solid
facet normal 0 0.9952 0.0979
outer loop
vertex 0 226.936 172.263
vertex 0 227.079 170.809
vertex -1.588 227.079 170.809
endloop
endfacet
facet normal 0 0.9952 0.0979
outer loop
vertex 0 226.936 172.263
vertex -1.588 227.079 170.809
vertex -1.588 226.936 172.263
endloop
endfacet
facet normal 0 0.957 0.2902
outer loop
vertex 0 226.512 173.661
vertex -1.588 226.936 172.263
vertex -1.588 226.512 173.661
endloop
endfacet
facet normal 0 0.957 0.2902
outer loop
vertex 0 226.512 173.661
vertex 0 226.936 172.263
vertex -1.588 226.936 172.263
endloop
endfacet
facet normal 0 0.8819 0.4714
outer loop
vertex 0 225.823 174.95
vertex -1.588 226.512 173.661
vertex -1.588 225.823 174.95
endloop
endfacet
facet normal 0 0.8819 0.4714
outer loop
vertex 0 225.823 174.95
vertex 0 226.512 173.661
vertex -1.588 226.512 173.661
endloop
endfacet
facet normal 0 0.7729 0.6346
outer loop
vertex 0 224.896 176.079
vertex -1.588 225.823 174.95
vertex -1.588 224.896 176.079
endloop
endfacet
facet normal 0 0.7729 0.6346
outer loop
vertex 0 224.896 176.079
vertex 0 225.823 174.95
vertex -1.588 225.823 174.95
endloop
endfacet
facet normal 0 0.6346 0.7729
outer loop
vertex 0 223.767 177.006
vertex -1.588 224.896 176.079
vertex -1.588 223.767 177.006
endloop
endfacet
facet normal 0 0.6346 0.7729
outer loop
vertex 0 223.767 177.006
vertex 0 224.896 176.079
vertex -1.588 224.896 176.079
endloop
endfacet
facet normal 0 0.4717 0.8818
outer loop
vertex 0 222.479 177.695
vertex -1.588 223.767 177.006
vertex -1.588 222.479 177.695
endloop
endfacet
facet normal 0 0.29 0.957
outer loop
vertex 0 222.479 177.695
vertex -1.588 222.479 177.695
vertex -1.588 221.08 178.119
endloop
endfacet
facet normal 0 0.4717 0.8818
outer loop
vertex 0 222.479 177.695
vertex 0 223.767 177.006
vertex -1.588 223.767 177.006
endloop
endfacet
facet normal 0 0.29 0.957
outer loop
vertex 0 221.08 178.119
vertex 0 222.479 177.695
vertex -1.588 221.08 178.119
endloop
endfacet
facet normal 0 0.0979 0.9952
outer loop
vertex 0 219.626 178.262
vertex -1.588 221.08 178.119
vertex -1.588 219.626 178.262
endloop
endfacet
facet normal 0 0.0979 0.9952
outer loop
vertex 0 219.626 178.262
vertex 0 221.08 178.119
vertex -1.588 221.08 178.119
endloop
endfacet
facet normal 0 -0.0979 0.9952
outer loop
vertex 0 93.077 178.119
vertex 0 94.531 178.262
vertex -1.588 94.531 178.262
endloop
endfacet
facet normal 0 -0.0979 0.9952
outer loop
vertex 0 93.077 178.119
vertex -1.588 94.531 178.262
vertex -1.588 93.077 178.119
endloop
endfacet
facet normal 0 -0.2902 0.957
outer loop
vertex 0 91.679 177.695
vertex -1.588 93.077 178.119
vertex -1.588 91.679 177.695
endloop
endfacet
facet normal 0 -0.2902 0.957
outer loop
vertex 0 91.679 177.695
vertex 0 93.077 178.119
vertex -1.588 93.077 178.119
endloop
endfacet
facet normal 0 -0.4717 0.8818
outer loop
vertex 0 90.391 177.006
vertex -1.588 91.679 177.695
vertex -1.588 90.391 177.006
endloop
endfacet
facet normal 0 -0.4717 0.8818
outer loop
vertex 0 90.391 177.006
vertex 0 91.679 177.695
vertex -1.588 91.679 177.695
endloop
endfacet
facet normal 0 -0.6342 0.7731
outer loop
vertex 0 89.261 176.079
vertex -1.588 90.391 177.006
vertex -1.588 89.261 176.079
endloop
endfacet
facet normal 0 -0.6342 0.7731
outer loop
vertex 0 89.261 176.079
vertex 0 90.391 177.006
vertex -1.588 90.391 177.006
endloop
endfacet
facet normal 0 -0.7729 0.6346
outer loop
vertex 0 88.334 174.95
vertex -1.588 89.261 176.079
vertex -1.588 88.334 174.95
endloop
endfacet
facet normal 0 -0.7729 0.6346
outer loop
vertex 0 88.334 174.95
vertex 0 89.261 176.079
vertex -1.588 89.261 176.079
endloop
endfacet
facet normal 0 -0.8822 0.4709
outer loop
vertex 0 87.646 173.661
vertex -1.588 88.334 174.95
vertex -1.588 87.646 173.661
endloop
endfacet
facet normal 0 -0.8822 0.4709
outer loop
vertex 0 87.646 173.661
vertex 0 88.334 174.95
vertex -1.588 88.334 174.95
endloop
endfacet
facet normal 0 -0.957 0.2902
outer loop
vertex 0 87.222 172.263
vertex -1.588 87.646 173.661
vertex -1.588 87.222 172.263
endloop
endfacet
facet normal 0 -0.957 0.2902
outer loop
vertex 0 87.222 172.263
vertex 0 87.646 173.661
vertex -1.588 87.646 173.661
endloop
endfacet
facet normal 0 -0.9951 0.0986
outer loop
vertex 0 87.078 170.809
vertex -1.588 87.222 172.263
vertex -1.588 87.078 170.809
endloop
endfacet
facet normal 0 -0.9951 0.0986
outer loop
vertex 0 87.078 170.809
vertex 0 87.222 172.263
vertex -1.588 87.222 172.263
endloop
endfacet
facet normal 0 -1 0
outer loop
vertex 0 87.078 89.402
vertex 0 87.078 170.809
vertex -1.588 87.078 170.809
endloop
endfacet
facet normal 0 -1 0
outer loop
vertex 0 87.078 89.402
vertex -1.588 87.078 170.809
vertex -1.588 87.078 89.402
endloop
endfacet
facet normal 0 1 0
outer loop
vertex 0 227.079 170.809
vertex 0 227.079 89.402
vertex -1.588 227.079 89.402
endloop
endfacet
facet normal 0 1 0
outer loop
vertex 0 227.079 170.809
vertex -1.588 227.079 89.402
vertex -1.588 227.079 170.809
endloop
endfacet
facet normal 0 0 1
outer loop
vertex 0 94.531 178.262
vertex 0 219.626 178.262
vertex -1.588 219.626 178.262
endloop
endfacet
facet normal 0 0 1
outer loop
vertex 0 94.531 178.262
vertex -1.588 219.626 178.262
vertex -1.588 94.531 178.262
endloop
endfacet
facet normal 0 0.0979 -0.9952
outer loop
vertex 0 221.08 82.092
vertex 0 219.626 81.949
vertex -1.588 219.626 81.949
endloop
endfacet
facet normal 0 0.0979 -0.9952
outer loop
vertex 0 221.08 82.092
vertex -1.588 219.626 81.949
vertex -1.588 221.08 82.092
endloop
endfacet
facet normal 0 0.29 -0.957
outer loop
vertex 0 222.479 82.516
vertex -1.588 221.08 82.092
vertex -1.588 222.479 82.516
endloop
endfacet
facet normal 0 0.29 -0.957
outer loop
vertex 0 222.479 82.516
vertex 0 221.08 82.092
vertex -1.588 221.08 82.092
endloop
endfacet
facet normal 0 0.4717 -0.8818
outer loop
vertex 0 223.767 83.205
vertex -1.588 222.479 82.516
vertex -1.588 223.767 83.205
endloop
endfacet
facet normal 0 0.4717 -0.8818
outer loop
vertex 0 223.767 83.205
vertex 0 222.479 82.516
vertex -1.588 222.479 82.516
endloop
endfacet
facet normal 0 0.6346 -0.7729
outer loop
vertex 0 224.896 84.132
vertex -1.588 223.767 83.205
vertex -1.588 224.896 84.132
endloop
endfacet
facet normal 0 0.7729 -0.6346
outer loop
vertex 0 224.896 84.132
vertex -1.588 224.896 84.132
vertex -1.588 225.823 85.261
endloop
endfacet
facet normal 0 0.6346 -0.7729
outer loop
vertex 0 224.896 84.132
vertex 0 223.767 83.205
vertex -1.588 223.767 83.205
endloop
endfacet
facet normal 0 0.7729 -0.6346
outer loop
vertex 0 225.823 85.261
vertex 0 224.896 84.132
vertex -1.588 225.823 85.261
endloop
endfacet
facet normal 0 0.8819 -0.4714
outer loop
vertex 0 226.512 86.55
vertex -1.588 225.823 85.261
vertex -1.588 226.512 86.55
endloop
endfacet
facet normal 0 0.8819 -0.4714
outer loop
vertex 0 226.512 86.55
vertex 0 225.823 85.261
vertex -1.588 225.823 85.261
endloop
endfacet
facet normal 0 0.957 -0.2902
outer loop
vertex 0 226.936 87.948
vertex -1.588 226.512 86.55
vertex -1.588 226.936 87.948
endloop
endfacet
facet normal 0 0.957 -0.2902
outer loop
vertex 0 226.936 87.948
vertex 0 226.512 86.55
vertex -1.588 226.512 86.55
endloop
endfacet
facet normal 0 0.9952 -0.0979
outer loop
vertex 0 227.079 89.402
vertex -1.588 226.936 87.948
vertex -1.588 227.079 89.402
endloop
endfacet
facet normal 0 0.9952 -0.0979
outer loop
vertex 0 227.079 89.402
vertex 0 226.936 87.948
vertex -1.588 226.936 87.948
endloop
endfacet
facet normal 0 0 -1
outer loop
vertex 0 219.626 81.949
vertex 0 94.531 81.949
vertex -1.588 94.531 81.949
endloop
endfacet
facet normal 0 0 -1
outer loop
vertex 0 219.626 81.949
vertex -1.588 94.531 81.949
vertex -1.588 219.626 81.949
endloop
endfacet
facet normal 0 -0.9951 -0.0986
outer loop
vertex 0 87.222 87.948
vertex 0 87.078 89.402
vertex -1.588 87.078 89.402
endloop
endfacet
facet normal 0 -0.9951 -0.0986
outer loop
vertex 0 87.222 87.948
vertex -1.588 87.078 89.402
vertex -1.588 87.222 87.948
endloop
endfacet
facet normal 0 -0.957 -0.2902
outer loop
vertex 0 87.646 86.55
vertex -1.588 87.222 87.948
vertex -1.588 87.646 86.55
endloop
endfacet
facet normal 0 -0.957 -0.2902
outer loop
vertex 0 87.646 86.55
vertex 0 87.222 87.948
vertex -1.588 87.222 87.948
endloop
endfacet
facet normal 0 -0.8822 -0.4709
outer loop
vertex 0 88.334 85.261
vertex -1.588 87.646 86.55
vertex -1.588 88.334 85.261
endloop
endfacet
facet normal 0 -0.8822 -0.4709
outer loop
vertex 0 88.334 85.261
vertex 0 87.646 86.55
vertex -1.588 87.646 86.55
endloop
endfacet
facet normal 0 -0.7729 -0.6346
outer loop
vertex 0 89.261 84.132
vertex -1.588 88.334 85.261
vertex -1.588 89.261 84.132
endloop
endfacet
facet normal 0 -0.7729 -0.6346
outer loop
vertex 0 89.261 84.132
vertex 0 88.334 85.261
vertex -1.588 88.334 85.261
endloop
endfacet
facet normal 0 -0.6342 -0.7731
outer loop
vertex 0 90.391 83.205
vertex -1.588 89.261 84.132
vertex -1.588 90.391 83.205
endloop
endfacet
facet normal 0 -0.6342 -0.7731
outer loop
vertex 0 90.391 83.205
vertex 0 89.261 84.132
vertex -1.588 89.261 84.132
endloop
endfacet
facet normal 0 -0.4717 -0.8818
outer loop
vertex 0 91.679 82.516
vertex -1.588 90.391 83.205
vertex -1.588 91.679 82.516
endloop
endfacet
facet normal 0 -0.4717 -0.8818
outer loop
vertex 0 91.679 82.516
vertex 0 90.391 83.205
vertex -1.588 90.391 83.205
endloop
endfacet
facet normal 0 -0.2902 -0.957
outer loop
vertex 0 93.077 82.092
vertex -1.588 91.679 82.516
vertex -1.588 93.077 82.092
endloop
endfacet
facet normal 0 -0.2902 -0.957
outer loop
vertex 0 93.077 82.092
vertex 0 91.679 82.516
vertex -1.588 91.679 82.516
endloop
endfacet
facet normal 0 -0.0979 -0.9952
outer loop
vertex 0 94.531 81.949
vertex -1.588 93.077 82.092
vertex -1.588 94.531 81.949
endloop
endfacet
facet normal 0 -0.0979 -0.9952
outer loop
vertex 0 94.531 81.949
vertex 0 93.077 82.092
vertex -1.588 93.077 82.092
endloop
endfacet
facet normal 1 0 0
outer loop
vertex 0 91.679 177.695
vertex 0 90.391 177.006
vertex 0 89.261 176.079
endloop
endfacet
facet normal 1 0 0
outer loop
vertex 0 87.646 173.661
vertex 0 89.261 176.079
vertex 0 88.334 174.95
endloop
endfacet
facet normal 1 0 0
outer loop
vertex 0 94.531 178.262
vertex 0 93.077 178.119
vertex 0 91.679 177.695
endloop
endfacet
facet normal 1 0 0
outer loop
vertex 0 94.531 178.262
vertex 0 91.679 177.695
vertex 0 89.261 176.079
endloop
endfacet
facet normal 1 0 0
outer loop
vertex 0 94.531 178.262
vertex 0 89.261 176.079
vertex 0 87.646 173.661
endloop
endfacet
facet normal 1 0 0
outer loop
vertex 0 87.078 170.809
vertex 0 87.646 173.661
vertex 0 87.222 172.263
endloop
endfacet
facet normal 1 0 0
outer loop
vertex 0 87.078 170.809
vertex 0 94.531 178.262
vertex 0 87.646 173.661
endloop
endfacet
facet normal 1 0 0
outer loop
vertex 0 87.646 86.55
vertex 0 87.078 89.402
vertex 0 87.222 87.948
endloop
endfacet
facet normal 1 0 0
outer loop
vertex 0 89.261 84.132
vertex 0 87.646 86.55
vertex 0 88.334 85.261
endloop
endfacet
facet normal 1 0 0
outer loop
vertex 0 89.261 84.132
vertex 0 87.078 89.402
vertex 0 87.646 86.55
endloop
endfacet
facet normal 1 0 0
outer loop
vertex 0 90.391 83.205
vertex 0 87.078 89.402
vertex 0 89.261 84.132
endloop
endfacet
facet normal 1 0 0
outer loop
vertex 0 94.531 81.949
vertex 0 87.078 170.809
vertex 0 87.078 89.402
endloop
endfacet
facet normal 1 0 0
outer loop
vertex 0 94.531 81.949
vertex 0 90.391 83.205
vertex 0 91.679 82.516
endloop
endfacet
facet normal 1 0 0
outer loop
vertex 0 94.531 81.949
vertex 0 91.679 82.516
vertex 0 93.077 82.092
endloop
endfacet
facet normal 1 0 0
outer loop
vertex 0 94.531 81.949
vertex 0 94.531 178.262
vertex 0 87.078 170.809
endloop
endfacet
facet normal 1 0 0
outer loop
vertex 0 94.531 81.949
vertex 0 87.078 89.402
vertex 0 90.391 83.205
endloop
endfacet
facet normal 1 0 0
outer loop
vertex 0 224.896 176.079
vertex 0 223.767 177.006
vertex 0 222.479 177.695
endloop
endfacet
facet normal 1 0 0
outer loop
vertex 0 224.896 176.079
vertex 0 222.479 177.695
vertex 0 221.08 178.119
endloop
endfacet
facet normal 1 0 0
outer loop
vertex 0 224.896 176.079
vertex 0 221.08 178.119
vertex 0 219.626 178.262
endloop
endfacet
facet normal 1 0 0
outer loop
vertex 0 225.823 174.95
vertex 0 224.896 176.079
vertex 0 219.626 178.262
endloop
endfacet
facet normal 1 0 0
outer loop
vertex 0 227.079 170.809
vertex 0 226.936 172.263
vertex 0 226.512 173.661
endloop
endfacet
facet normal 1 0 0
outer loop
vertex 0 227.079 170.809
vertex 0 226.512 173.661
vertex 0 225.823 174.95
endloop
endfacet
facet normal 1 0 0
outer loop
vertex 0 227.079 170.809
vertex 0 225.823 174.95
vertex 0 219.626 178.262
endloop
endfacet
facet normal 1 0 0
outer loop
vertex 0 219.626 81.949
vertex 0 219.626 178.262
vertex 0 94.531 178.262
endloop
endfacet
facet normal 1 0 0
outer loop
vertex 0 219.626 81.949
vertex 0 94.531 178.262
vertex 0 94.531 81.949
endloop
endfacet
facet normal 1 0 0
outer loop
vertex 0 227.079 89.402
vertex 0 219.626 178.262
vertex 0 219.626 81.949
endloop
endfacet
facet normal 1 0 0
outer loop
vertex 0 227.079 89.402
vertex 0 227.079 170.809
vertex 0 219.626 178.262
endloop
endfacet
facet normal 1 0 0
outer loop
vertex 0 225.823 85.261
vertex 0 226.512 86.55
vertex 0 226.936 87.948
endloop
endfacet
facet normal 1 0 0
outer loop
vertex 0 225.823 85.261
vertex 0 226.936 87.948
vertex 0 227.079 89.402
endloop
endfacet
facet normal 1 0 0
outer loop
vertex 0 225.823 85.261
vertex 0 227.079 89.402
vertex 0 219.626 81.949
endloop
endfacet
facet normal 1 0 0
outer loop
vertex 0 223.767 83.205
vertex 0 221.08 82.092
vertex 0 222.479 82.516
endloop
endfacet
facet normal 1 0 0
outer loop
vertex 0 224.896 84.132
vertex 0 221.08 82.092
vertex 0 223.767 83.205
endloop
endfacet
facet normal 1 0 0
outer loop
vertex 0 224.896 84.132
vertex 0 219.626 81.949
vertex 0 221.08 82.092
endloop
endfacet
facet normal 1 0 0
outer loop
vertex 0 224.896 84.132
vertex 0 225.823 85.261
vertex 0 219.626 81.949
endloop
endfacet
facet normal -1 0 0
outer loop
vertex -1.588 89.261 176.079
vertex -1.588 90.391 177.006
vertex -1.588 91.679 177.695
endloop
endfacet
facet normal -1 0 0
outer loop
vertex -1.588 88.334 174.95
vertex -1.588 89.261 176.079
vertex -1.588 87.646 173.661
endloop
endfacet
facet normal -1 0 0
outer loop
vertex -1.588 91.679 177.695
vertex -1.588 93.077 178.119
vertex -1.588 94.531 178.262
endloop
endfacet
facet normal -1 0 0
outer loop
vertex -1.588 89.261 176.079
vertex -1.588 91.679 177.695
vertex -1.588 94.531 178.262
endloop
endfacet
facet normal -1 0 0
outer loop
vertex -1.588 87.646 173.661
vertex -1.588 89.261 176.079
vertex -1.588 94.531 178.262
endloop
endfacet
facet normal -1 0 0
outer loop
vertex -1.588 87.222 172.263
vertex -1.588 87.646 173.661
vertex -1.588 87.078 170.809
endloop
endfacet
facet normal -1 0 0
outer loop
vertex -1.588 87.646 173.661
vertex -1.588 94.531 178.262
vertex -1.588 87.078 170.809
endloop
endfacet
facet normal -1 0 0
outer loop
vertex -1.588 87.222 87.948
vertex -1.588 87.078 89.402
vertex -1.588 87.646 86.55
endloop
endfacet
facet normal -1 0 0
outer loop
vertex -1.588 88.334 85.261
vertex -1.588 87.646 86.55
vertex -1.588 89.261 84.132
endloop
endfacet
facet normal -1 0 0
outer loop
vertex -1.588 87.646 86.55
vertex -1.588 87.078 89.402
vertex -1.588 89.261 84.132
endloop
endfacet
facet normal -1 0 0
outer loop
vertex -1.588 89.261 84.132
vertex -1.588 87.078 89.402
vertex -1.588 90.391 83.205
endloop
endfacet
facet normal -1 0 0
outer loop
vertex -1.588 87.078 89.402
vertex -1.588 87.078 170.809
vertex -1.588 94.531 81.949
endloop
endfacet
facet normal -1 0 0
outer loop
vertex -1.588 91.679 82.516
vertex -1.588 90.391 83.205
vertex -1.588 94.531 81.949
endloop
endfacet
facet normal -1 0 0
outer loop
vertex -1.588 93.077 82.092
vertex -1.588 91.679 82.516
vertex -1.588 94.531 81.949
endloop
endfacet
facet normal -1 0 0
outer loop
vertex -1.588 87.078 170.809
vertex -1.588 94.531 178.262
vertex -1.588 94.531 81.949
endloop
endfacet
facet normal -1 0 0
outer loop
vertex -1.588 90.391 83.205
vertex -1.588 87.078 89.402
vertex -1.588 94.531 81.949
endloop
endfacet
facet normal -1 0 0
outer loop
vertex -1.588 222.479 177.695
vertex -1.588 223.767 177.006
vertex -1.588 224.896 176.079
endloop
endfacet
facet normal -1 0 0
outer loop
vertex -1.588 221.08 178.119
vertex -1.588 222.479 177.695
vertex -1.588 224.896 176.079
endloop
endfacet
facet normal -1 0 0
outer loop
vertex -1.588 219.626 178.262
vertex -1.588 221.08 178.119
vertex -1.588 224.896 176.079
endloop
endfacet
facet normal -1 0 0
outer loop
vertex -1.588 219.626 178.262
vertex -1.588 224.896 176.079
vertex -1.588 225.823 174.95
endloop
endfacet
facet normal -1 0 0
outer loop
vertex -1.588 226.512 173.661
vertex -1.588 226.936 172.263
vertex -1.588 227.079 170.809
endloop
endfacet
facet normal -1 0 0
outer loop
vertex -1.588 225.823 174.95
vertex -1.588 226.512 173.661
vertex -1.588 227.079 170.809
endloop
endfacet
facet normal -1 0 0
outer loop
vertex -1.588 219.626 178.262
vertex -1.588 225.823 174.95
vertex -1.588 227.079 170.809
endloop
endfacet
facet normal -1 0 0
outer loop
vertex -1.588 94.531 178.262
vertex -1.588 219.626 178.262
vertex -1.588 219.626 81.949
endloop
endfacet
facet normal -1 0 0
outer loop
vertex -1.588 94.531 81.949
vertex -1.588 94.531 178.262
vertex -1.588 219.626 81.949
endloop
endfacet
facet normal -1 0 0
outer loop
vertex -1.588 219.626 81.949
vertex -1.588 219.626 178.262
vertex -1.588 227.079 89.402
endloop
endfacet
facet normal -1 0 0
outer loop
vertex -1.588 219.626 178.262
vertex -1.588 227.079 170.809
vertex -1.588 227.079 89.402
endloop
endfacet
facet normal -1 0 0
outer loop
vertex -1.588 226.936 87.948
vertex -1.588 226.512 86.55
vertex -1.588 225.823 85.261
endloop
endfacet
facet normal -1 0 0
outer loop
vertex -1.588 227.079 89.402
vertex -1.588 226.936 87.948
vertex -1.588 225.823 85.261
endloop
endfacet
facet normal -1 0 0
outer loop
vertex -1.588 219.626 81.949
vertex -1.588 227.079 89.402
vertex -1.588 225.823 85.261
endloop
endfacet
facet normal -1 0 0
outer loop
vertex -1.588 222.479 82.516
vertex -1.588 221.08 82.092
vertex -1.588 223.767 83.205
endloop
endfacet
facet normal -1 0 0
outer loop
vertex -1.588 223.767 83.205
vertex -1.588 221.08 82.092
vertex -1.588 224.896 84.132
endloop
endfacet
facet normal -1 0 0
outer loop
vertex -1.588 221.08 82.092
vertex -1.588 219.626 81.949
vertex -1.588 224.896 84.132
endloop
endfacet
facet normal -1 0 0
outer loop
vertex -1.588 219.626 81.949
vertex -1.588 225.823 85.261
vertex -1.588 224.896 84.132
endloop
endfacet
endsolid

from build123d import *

# Parameters (mm, degrees)
BOSS_EXTRUDE1_DEPTH = 1.5875


with BuildPart() as part:
    # Sketch1 → Boss-Extrude1 (new body)
    with BuildSketch(Plane(origin=(0, 0, 0), x_dir=(0, 0, -1), z_dir=(1, 0, 0))):
        with BuildLine():
            Line((-81.948946946, 94.531421496), (-81.948946946, 219.626421496))
            ThreePointArc((-81.948946946, 219.626421496), (-84.131880106, 224.896488336), (-89.401946946, 227.079421496))
            Line((-89.401946946, 227.079421496), (-170.808946946, 227.079421496))
            ThreePointArc((-170.808946946, 227.079421496), (-176.079013786, 224.896488336), (-178.261946946, 219.626421496))
            Line((-178.261946946, 219.626421496), (-178.261946946, 94.531421496))
            ThreePointArc((-178.261946946, 94.531421496), (-176.079013786, 89.261354656), (-170.808946946, 87.078421496))
            Line((-170.808946946, 87.078421496), (-89.401946946, 87.078421496))
            ThreePointArc((-89.401946946, 87.078421496), (-84.131880106, 89.261354656), (-81.948946946, 94.531421496))
        make_face()
    extrude(amount=-BOSS_EXTRUDE1_DEPTH)


solid = part.part
